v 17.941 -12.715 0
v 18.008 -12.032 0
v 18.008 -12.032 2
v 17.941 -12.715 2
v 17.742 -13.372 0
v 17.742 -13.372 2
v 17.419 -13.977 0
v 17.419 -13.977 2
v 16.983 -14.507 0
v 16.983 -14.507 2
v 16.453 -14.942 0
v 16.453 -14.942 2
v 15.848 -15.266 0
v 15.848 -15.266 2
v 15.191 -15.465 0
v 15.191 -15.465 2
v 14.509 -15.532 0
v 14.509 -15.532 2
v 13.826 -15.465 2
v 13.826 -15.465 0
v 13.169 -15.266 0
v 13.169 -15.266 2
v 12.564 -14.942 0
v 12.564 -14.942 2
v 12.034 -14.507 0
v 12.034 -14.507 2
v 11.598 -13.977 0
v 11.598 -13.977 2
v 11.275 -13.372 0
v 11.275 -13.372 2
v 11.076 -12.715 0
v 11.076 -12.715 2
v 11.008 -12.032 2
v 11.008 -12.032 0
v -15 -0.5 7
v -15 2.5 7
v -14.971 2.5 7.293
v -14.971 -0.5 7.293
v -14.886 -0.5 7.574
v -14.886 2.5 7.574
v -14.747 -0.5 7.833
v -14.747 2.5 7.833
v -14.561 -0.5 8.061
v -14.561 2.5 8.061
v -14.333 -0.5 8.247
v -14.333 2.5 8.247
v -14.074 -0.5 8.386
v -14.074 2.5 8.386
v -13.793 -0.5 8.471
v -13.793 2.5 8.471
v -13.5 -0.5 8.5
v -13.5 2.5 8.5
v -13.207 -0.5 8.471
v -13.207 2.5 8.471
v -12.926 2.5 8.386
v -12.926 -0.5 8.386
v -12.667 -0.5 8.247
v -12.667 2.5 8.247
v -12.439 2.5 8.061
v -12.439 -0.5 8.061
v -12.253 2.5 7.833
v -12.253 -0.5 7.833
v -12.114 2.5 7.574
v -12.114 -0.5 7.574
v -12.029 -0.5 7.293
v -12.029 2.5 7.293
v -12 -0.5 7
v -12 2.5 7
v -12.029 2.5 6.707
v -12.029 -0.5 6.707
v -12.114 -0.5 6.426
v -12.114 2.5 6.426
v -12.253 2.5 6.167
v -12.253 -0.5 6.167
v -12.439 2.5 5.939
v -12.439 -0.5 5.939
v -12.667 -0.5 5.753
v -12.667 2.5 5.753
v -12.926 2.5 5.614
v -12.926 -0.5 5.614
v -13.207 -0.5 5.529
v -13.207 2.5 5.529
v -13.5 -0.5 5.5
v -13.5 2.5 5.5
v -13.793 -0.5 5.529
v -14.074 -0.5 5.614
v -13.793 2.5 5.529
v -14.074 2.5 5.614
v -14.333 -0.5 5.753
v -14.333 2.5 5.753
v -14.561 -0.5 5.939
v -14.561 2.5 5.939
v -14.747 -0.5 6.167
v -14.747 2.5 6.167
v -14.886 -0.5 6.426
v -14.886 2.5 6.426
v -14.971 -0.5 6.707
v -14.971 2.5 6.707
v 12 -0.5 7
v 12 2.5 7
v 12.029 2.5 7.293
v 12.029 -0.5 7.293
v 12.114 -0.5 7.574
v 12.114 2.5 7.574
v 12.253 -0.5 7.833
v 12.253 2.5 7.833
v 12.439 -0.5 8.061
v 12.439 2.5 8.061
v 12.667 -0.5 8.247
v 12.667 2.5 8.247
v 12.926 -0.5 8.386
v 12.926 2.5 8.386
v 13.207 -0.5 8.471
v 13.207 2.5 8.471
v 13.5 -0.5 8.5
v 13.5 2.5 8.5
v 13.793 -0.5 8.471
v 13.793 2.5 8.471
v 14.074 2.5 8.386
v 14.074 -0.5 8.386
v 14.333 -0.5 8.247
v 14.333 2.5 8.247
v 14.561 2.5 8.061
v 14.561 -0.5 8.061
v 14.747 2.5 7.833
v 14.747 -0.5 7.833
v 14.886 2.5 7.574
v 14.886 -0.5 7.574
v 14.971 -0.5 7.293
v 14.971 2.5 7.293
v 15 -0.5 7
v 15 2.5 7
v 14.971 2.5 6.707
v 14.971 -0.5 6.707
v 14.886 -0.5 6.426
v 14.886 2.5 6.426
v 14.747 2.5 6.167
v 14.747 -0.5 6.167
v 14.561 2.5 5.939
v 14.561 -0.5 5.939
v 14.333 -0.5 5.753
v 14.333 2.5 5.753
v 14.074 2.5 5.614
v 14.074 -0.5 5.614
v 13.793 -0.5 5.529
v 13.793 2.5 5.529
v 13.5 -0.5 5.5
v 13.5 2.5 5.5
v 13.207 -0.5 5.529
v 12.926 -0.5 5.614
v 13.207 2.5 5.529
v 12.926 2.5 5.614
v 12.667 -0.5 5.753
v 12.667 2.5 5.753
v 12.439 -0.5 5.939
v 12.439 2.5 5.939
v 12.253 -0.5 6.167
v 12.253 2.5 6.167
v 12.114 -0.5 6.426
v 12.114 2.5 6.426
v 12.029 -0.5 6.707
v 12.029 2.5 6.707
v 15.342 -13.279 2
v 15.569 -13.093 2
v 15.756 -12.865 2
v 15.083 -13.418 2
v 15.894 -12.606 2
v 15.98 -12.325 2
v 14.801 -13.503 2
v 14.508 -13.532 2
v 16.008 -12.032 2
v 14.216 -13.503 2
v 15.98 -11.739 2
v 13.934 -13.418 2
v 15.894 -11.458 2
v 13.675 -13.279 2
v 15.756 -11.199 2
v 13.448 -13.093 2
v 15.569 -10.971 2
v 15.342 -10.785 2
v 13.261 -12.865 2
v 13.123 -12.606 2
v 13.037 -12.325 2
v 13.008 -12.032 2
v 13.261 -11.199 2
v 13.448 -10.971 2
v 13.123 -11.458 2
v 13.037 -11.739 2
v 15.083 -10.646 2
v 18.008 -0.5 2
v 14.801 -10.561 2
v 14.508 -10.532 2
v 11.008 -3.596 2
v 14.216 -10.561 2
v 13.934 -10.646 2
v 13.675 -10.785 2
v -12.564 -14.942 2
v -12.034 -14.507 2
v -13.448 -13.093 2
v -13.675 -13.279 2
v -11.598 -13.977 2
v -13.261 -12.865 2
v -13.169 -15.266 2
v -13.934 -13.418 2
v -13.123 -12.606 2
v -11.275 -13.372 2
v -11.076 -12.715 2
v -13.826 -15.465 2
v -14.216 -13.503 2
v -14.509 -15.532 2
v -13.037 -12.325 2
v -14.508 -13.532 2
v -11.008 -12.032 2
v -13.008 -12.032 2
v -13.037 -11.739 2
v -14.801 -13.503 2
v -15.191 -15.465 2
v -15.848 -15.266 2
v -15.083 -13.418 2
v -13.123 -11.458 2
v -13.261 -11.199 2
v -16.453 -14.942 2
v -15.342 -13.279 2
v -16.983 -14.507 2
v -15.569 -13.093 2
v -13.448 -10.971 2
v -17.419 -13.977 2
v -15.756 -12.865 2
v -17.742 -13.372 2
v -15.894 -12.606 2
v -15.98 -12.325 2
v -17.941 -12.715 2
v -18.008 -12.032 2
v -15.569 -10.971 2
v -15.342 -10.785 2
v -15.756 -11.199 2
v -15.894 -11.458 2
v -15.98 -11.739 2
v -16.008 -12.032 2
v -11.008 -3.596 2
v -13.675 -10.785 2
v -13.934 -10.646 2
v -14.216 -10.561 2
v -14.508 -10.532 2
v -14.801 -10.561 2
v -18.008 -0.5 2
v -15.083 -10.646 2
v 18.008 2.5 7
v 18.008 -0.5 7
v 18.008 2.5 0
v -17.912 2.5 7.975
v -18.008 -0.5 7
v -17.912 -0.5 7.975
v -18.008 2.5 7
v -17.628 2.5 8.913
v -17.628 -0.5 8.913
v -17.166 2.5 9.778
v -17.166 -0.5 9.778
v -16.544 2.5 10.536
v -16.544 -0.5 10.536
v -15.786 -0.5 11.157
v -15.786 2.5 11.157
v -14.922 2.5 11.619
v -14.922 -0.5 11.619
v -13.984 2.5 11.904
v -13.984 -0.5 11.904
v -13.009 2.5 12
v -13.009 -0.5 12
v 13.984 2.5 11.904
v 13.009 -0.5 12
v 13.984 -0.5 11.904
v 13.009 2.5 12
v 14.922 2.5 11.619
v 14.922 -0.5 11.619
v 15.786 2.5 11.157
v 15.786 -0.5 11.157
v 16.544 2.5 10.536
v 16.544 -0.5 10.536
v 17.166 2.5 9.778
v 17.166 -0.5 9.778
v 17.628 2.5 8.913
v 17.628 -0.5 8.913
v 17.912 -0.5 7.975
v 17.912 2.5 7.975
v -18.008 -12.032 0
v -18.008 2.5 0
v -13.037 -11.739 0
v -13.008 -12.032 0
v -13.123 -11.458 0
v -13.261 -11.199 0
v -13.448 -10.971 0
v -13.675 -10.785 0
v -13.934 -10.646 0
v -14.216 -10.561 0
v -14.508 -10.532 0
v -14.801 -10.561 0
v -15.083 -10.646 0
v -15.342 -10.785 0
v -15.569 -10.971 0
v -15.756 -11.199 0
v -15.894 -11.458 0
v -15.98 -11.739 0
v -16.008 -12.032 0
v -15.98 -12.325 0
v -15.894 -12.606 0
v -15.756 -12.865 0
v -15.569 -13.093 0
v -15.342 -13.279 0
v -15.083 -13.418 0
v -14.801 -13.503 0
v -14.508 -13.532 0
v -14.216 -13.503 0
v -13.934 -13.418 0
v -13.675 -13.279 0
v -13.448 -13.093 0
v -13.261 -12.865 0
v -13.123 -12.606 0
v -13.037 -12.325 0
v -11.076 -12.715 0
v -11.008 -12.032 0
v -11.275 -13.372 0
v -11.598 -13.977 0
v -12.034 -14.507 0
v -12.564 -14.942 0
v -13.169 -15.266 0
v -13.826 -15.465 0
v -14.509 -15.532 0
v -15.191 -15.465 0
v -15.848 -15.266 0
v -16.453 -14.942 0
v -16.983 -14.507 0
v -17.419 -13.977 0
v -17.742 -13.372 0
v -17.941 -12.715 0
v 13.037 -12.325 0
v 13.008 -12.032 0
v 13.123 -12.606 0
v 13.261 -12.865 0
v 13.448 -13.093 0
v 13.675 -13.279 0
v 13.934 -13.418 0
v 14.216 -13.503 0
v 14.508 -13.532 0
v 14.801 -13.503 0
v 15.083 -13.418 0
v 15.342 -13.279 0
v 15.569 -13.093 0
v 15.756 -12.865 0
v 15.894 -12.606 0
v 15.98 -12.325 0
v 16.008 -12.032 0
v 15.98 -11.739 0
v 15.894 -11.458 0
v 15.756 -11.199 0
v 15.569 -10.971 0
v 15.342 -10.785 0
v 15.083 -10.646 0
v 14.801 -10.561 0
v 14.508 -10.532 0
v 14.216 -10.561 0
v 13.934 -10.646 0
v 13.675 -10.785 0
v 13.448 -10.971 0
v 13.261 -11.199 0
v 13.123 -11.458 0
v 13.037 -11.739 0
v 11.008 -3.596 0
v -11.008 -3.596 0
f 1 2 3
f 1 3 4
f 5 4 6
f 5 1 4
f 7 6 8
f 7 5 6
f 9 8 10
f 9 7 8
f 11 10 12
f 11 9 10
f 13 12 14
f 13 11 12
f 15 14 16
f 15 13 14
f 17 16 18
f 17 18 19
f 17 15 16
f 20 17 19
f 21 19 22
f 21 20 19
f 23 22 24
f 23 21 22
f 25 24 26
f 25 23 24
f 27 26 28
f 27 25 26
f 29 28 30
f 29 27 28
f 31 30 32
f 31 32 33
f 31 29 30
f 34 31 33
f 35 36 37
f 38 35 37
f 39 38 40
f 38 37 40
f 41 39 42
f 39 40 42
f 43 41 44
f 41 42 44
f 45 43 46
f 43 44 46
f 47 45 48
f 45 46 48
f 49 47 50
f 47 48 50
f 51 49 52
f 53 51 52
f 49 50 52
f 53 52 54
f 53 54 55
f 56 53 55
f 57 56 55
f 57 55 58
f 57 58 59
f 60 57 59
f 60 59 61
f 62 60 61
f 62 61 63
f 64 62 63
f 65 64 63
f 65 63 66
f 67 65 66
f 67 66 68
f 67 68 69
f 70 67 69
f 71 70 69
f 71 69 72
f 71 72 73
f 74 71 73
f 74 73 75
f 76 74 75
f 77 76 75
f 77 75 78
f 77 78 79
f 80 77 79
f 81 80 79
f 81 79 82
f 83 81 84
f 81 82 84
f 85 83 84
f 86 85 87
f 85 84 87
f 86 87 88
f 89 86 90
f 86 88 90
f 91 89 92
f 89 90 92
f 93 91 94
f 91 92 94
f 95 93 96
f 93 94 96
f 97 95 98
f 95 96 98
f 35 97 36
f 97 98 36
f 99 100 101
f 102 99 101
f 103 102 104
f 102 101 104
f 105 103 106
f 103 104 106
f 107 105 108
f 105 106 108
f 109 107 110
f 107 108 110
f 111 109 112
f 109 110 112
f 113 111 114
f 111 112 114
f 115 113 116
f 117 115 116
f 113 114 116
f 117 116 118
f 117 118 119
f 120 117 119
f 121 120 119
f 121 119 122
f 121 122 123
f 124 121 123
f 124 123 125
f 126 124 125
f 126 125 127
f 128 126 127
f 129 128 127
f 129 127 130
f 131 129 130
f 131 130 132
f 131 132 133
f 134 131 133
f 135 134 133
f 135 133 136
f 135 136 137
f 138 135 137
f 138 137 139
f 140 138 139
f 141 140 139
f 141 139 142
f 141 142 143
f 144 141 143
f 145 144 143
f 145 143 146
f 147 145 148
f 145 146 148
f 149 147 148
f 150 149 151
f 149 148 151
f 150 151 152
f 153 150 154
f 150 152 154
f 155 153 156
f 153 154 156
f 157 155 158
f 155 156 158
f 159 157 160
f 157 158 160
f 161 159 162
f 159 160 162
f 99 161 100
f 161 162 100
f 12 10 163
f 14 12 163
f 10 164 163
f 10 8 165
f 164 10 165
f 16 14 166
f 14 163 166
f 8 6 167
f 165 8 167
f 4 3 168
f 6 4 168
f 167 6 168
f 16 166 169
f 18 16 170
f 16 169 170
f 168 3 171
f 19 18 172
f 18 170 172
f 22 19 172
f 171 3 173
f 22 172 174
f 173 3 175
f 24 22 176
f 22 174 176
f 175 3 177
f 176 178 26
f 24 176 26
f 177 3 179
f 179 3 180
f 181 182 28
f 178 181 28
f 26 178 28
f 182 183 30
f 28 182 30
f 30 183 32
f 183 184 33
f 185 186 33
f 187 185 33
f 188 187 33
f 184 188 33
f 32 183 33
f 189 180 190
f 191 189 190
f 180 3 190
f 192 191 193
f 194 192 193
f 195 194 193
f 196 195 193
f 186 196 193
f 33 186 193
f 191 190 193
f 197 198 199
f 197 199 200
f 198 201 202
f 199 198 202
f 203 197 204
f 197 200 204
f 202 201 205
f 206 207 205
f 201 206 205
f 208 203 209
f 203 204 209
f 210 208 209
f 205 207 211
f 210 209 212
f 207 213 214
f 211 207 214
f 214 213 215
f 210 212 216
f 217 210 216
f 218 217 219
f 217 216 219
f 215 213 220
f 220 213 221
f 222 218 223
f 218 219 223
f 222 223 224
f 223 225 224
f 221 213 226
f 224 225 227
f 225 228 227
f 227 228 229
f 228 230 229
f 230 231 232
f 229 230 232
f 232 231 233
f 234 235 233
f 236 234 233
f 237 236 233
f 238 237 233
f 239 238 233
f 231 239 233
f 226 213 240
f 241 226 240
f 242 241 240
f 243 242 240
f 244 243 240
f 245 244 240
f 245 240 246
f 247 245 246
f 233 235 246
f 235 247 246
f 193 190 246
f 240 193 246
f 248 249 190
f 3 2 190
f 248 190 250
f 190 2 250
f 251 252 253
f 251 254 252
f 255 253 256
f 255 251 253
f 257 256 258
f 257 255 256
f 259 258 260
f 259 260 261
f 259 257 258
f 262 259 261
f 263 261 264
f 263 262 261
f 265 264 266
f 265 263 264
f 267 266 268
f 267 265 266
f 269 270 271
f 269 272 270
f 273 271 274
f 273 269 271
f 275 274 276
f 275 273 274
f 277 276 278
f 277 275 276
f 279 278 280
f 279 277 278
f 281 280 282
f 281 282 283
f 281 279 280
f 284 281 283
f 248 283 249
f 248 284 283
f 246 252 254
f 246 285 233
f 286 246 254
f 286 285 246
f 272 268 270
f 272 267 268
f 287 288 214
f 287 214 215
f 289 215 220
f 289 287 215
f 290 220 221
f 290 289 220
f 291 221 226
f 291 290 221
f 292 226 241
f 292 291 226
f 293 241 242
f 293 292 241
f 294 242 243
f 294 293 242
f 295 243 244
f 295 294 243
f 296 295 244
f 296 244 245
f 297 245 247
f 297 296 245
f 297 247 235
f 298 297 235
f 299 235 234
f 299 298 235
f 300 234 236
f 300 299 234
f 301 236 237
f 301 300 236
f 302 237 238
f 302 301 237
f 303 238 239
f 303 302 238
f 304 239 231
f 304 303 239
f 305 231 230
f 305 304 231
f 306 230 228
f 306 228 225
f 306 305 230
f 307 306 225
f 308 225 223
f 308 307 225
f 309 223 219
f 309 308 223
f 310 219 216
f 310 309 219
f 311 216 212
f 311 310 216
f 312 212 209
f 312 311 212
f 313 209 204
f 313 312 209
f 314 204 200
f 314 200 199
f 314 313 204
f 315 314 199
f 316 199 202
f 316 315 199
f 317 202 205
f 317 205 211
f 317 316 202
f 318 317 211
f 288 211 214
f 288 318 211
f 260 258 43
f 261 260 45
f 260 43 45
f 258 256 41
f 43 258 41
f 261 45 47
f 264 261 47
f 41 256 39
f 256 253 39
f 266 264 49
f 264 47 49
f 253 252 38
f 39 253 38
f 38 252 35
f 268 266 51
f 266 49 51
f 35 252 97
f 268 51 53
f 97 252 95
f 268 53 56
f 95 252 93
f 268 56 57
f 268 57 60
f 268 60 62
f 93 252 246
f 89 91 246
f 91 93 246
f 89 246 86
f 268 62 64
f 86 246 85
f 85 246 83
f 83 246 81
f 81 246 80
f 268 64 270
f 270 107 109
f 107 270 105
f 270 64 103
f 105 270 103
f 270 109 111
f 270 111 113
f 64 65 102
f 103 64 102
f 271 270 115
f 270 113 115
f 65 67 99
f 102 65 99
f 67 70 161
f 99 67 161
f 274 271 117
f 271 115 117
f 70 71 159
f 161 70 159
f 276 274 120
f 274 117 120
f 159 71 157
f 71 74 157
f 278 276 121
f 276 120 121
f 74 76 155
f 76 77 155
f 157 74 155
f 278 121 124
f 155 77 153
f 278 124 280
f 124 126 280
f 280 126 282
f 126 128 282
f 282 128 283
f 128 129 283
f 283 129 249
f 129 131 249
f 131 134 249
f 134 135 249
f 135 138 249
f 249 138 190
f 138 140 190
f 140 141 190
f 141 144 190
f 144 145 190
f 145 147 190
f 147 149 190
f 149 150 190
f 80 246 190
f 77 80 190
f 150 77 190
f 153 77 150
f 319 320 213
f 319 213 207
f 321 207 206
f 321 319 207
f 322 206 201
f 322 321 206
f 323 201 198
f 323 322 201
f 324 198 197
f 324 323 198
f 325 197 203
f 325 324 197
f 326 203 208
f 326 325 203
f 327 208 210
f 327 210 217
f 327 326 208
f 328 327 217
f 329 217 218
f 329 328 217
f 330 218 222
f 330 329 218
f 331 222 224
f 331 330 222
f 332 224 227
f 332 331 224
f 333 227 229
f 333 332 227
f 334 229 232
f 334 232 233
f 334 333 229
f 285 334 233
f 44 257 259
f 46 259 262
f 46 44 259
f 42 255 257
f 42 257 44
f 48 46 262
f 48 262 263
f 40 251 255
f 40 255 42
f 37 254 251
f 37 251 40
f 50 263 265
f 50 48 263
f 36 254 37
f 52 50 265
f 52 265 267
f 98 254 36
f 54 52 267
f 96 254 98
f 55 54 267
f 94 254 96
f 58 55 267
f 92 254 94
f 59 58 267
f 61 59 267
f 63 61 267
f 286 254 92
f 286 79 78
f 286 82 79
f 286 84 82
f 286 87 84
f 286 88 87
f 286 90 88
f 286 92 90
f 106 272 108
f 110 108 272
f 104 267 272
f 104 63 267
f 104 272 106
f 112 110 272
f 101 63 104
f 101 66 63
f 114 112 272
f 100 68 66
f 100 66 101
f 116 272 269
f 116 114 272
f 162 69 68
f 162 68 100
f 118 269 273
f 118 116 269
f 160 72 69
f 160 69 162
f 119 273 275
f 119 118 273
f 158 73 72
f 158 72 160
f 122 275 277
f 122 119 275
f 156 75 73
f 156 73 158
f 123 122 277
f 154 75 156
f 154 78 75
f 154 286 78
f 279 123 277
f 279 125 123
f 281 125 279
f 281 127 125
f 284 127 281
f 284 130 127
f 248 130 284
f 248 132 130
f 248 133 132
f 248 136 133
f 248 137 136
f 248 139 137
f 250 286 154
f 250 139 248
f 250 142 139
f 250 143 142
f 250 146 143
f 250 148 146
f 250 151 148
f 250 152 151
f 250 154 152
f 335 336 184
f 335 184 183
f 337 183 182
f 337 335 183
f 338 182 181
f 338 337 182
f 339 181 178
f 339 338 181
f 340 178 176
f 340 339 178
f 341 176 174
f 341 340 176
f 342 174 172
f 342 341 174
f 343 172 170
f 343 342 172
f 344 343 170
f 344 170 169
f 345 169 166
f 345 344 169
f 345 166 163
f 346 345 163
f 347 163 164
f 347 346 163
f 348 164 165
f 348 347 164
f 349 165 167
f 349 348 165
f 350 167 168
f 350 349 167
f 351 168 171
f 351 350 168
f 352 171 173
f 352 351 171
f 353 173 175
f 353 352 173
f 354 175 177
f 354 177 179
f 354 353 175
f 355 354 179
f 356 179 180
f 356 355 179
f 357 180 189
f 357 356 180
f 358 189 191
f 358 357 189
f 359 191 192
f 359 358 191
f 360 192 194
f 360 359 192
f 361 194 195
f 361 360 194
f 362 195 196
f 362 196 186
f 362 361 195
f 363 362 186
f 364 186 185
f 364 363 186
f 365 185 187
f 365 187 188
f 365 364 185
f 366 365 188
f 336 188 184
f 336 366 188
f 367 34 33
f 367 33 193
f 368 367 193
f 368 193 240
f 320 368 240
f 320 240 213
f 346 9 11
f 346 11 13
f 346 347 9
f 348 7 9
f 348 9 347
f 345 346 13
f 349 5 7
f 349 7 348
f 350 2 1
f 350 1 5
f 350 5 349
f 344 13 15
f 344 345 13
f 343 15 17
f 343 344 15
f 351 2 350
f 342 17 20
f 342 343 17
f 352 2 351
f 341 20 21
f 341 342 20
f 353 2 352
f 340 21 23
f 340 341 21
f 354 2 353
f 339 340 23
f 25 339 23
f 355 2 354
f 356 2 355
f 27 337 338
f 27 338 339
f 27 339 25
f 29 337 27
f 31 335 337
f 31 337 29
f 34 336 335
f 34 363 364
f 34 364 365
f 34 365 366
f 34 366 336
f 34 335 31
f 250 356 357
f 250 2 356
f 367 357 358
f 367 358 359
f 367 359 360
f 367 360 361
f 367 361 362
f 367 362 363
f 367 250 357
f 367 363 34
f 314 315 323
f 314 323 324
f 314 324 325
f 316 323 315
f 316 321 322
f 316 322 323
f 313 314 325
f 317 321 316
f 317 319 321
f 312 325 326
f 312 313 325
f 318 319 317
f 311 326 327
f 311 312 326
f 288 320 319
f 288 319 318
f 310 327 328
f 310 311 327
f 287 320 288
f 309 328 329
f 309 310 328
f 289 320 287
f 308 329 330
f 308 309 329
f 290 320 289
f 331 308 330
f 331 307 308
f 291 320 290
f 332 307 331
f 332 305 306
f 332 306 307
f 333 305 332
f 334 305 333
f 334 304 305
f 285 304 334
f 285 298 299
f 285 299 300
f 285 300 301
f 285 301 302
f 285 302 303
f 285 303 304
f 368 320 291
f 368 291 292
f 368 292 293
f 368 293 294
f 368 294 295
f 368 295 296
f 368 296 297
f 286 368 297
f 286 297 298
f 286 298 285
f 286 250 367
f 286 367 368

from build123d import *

# Parameters (mm, degrees)
SKETCH_1_R          = 1.5
EXTRUDE_1_DEPTH     = 2
SKETCH_2_W          = 36.017
SKETCH_2_H          = 3
EXTRUDE_2_DEPTH     = 10
SKETCH_3_R          = 1.5
CUT_EXTRUDE_1_DEPTH = 29.168487204
FILLET_1_R          = 5


with BuildPart() as part:
    # 草图1 → 凸台-拉伸1 (new body)
    with BuildSketch(Plane.XY):
        with BuildLine():
            Line((-18.0085, 2.5), (18.0085, 2.5))
            Line((18.0085, 2.5), (18.0085, -2.5))
            Line((18.0085, -2.5), (18.0085, -12.032126861))
            ThreePointArc((18.0085, -12.032126861), (14.5085, -15.532126861), (11.0085, -12.032126861))
            Line((11.0085, -12.032126861), (11.0085, -3.595826486))
            Line((11.0085, -3.595826486), (-11.0085, -3.595826486))
            Line((-11.0085, -3.595826486), (-11.0085, -12.032126861))
            ThreePointArc((-11.0085, -12.032126861), (-14.5085, -15.532126861), (-18.0085, -12.032126861))
            Line((-18.0085, -12.032126861), (-18.0085, -2.5))
            Line((-18.0085, -2.5), (-18.0085, 2.5))
        make_face()
        with Locations((-14.5085, -12.032126861)):
            Circle(SKETCH_1_R, mode=Mode.SUBTRACT)
        with Locations(Location((14.5085, -12.032126861, 0), (0, 0, 180))):
            Circle(SKETCH_1_R, mode=Mode.SUBTRACT)
    extrude(amount=EXTRUDE_1_DEPTH)

    # 草图2 → 凸台-拉伸2 (add)
    with BuildSketch(Plane.XY.offset(2)):
        with Locations((0, 1)):
            Rectangle(SKETCH_2_W, SKETCH_2_H)
    extrude(amount=EXTRUDE_2_DEPTH)

    # 草图3 → 切除-拉伸1 (cut, through all)
    with BuildSketch(Plane(origin=(0, 2.5, 0), x_dir=(1, 0, 0), z_dir=(0, 1, 0))):
        with Locations(Location((-13.5, -7, 0), (0, 0, 180))):
            Circle(SKETCH_3_R)
        with Locations(Location((13.5, -7, 0), (0, 0, 180))):
            Circle(SKETCH_3_R)
    extrude(amount=-CUT_EXTRUDE_1_DEPTH, mode=Mode.SUBTRACT)

    # 圆角1
    fillet_1_edges = [part.edges().sort_by_distance(p)[0] for p in [
        (-18.0085, 1, 12),
        (18.0085, 1, 12),
    ]]
    fillet(fillet_1_edges, radius=FILLET_1_R)


solid = part.part
